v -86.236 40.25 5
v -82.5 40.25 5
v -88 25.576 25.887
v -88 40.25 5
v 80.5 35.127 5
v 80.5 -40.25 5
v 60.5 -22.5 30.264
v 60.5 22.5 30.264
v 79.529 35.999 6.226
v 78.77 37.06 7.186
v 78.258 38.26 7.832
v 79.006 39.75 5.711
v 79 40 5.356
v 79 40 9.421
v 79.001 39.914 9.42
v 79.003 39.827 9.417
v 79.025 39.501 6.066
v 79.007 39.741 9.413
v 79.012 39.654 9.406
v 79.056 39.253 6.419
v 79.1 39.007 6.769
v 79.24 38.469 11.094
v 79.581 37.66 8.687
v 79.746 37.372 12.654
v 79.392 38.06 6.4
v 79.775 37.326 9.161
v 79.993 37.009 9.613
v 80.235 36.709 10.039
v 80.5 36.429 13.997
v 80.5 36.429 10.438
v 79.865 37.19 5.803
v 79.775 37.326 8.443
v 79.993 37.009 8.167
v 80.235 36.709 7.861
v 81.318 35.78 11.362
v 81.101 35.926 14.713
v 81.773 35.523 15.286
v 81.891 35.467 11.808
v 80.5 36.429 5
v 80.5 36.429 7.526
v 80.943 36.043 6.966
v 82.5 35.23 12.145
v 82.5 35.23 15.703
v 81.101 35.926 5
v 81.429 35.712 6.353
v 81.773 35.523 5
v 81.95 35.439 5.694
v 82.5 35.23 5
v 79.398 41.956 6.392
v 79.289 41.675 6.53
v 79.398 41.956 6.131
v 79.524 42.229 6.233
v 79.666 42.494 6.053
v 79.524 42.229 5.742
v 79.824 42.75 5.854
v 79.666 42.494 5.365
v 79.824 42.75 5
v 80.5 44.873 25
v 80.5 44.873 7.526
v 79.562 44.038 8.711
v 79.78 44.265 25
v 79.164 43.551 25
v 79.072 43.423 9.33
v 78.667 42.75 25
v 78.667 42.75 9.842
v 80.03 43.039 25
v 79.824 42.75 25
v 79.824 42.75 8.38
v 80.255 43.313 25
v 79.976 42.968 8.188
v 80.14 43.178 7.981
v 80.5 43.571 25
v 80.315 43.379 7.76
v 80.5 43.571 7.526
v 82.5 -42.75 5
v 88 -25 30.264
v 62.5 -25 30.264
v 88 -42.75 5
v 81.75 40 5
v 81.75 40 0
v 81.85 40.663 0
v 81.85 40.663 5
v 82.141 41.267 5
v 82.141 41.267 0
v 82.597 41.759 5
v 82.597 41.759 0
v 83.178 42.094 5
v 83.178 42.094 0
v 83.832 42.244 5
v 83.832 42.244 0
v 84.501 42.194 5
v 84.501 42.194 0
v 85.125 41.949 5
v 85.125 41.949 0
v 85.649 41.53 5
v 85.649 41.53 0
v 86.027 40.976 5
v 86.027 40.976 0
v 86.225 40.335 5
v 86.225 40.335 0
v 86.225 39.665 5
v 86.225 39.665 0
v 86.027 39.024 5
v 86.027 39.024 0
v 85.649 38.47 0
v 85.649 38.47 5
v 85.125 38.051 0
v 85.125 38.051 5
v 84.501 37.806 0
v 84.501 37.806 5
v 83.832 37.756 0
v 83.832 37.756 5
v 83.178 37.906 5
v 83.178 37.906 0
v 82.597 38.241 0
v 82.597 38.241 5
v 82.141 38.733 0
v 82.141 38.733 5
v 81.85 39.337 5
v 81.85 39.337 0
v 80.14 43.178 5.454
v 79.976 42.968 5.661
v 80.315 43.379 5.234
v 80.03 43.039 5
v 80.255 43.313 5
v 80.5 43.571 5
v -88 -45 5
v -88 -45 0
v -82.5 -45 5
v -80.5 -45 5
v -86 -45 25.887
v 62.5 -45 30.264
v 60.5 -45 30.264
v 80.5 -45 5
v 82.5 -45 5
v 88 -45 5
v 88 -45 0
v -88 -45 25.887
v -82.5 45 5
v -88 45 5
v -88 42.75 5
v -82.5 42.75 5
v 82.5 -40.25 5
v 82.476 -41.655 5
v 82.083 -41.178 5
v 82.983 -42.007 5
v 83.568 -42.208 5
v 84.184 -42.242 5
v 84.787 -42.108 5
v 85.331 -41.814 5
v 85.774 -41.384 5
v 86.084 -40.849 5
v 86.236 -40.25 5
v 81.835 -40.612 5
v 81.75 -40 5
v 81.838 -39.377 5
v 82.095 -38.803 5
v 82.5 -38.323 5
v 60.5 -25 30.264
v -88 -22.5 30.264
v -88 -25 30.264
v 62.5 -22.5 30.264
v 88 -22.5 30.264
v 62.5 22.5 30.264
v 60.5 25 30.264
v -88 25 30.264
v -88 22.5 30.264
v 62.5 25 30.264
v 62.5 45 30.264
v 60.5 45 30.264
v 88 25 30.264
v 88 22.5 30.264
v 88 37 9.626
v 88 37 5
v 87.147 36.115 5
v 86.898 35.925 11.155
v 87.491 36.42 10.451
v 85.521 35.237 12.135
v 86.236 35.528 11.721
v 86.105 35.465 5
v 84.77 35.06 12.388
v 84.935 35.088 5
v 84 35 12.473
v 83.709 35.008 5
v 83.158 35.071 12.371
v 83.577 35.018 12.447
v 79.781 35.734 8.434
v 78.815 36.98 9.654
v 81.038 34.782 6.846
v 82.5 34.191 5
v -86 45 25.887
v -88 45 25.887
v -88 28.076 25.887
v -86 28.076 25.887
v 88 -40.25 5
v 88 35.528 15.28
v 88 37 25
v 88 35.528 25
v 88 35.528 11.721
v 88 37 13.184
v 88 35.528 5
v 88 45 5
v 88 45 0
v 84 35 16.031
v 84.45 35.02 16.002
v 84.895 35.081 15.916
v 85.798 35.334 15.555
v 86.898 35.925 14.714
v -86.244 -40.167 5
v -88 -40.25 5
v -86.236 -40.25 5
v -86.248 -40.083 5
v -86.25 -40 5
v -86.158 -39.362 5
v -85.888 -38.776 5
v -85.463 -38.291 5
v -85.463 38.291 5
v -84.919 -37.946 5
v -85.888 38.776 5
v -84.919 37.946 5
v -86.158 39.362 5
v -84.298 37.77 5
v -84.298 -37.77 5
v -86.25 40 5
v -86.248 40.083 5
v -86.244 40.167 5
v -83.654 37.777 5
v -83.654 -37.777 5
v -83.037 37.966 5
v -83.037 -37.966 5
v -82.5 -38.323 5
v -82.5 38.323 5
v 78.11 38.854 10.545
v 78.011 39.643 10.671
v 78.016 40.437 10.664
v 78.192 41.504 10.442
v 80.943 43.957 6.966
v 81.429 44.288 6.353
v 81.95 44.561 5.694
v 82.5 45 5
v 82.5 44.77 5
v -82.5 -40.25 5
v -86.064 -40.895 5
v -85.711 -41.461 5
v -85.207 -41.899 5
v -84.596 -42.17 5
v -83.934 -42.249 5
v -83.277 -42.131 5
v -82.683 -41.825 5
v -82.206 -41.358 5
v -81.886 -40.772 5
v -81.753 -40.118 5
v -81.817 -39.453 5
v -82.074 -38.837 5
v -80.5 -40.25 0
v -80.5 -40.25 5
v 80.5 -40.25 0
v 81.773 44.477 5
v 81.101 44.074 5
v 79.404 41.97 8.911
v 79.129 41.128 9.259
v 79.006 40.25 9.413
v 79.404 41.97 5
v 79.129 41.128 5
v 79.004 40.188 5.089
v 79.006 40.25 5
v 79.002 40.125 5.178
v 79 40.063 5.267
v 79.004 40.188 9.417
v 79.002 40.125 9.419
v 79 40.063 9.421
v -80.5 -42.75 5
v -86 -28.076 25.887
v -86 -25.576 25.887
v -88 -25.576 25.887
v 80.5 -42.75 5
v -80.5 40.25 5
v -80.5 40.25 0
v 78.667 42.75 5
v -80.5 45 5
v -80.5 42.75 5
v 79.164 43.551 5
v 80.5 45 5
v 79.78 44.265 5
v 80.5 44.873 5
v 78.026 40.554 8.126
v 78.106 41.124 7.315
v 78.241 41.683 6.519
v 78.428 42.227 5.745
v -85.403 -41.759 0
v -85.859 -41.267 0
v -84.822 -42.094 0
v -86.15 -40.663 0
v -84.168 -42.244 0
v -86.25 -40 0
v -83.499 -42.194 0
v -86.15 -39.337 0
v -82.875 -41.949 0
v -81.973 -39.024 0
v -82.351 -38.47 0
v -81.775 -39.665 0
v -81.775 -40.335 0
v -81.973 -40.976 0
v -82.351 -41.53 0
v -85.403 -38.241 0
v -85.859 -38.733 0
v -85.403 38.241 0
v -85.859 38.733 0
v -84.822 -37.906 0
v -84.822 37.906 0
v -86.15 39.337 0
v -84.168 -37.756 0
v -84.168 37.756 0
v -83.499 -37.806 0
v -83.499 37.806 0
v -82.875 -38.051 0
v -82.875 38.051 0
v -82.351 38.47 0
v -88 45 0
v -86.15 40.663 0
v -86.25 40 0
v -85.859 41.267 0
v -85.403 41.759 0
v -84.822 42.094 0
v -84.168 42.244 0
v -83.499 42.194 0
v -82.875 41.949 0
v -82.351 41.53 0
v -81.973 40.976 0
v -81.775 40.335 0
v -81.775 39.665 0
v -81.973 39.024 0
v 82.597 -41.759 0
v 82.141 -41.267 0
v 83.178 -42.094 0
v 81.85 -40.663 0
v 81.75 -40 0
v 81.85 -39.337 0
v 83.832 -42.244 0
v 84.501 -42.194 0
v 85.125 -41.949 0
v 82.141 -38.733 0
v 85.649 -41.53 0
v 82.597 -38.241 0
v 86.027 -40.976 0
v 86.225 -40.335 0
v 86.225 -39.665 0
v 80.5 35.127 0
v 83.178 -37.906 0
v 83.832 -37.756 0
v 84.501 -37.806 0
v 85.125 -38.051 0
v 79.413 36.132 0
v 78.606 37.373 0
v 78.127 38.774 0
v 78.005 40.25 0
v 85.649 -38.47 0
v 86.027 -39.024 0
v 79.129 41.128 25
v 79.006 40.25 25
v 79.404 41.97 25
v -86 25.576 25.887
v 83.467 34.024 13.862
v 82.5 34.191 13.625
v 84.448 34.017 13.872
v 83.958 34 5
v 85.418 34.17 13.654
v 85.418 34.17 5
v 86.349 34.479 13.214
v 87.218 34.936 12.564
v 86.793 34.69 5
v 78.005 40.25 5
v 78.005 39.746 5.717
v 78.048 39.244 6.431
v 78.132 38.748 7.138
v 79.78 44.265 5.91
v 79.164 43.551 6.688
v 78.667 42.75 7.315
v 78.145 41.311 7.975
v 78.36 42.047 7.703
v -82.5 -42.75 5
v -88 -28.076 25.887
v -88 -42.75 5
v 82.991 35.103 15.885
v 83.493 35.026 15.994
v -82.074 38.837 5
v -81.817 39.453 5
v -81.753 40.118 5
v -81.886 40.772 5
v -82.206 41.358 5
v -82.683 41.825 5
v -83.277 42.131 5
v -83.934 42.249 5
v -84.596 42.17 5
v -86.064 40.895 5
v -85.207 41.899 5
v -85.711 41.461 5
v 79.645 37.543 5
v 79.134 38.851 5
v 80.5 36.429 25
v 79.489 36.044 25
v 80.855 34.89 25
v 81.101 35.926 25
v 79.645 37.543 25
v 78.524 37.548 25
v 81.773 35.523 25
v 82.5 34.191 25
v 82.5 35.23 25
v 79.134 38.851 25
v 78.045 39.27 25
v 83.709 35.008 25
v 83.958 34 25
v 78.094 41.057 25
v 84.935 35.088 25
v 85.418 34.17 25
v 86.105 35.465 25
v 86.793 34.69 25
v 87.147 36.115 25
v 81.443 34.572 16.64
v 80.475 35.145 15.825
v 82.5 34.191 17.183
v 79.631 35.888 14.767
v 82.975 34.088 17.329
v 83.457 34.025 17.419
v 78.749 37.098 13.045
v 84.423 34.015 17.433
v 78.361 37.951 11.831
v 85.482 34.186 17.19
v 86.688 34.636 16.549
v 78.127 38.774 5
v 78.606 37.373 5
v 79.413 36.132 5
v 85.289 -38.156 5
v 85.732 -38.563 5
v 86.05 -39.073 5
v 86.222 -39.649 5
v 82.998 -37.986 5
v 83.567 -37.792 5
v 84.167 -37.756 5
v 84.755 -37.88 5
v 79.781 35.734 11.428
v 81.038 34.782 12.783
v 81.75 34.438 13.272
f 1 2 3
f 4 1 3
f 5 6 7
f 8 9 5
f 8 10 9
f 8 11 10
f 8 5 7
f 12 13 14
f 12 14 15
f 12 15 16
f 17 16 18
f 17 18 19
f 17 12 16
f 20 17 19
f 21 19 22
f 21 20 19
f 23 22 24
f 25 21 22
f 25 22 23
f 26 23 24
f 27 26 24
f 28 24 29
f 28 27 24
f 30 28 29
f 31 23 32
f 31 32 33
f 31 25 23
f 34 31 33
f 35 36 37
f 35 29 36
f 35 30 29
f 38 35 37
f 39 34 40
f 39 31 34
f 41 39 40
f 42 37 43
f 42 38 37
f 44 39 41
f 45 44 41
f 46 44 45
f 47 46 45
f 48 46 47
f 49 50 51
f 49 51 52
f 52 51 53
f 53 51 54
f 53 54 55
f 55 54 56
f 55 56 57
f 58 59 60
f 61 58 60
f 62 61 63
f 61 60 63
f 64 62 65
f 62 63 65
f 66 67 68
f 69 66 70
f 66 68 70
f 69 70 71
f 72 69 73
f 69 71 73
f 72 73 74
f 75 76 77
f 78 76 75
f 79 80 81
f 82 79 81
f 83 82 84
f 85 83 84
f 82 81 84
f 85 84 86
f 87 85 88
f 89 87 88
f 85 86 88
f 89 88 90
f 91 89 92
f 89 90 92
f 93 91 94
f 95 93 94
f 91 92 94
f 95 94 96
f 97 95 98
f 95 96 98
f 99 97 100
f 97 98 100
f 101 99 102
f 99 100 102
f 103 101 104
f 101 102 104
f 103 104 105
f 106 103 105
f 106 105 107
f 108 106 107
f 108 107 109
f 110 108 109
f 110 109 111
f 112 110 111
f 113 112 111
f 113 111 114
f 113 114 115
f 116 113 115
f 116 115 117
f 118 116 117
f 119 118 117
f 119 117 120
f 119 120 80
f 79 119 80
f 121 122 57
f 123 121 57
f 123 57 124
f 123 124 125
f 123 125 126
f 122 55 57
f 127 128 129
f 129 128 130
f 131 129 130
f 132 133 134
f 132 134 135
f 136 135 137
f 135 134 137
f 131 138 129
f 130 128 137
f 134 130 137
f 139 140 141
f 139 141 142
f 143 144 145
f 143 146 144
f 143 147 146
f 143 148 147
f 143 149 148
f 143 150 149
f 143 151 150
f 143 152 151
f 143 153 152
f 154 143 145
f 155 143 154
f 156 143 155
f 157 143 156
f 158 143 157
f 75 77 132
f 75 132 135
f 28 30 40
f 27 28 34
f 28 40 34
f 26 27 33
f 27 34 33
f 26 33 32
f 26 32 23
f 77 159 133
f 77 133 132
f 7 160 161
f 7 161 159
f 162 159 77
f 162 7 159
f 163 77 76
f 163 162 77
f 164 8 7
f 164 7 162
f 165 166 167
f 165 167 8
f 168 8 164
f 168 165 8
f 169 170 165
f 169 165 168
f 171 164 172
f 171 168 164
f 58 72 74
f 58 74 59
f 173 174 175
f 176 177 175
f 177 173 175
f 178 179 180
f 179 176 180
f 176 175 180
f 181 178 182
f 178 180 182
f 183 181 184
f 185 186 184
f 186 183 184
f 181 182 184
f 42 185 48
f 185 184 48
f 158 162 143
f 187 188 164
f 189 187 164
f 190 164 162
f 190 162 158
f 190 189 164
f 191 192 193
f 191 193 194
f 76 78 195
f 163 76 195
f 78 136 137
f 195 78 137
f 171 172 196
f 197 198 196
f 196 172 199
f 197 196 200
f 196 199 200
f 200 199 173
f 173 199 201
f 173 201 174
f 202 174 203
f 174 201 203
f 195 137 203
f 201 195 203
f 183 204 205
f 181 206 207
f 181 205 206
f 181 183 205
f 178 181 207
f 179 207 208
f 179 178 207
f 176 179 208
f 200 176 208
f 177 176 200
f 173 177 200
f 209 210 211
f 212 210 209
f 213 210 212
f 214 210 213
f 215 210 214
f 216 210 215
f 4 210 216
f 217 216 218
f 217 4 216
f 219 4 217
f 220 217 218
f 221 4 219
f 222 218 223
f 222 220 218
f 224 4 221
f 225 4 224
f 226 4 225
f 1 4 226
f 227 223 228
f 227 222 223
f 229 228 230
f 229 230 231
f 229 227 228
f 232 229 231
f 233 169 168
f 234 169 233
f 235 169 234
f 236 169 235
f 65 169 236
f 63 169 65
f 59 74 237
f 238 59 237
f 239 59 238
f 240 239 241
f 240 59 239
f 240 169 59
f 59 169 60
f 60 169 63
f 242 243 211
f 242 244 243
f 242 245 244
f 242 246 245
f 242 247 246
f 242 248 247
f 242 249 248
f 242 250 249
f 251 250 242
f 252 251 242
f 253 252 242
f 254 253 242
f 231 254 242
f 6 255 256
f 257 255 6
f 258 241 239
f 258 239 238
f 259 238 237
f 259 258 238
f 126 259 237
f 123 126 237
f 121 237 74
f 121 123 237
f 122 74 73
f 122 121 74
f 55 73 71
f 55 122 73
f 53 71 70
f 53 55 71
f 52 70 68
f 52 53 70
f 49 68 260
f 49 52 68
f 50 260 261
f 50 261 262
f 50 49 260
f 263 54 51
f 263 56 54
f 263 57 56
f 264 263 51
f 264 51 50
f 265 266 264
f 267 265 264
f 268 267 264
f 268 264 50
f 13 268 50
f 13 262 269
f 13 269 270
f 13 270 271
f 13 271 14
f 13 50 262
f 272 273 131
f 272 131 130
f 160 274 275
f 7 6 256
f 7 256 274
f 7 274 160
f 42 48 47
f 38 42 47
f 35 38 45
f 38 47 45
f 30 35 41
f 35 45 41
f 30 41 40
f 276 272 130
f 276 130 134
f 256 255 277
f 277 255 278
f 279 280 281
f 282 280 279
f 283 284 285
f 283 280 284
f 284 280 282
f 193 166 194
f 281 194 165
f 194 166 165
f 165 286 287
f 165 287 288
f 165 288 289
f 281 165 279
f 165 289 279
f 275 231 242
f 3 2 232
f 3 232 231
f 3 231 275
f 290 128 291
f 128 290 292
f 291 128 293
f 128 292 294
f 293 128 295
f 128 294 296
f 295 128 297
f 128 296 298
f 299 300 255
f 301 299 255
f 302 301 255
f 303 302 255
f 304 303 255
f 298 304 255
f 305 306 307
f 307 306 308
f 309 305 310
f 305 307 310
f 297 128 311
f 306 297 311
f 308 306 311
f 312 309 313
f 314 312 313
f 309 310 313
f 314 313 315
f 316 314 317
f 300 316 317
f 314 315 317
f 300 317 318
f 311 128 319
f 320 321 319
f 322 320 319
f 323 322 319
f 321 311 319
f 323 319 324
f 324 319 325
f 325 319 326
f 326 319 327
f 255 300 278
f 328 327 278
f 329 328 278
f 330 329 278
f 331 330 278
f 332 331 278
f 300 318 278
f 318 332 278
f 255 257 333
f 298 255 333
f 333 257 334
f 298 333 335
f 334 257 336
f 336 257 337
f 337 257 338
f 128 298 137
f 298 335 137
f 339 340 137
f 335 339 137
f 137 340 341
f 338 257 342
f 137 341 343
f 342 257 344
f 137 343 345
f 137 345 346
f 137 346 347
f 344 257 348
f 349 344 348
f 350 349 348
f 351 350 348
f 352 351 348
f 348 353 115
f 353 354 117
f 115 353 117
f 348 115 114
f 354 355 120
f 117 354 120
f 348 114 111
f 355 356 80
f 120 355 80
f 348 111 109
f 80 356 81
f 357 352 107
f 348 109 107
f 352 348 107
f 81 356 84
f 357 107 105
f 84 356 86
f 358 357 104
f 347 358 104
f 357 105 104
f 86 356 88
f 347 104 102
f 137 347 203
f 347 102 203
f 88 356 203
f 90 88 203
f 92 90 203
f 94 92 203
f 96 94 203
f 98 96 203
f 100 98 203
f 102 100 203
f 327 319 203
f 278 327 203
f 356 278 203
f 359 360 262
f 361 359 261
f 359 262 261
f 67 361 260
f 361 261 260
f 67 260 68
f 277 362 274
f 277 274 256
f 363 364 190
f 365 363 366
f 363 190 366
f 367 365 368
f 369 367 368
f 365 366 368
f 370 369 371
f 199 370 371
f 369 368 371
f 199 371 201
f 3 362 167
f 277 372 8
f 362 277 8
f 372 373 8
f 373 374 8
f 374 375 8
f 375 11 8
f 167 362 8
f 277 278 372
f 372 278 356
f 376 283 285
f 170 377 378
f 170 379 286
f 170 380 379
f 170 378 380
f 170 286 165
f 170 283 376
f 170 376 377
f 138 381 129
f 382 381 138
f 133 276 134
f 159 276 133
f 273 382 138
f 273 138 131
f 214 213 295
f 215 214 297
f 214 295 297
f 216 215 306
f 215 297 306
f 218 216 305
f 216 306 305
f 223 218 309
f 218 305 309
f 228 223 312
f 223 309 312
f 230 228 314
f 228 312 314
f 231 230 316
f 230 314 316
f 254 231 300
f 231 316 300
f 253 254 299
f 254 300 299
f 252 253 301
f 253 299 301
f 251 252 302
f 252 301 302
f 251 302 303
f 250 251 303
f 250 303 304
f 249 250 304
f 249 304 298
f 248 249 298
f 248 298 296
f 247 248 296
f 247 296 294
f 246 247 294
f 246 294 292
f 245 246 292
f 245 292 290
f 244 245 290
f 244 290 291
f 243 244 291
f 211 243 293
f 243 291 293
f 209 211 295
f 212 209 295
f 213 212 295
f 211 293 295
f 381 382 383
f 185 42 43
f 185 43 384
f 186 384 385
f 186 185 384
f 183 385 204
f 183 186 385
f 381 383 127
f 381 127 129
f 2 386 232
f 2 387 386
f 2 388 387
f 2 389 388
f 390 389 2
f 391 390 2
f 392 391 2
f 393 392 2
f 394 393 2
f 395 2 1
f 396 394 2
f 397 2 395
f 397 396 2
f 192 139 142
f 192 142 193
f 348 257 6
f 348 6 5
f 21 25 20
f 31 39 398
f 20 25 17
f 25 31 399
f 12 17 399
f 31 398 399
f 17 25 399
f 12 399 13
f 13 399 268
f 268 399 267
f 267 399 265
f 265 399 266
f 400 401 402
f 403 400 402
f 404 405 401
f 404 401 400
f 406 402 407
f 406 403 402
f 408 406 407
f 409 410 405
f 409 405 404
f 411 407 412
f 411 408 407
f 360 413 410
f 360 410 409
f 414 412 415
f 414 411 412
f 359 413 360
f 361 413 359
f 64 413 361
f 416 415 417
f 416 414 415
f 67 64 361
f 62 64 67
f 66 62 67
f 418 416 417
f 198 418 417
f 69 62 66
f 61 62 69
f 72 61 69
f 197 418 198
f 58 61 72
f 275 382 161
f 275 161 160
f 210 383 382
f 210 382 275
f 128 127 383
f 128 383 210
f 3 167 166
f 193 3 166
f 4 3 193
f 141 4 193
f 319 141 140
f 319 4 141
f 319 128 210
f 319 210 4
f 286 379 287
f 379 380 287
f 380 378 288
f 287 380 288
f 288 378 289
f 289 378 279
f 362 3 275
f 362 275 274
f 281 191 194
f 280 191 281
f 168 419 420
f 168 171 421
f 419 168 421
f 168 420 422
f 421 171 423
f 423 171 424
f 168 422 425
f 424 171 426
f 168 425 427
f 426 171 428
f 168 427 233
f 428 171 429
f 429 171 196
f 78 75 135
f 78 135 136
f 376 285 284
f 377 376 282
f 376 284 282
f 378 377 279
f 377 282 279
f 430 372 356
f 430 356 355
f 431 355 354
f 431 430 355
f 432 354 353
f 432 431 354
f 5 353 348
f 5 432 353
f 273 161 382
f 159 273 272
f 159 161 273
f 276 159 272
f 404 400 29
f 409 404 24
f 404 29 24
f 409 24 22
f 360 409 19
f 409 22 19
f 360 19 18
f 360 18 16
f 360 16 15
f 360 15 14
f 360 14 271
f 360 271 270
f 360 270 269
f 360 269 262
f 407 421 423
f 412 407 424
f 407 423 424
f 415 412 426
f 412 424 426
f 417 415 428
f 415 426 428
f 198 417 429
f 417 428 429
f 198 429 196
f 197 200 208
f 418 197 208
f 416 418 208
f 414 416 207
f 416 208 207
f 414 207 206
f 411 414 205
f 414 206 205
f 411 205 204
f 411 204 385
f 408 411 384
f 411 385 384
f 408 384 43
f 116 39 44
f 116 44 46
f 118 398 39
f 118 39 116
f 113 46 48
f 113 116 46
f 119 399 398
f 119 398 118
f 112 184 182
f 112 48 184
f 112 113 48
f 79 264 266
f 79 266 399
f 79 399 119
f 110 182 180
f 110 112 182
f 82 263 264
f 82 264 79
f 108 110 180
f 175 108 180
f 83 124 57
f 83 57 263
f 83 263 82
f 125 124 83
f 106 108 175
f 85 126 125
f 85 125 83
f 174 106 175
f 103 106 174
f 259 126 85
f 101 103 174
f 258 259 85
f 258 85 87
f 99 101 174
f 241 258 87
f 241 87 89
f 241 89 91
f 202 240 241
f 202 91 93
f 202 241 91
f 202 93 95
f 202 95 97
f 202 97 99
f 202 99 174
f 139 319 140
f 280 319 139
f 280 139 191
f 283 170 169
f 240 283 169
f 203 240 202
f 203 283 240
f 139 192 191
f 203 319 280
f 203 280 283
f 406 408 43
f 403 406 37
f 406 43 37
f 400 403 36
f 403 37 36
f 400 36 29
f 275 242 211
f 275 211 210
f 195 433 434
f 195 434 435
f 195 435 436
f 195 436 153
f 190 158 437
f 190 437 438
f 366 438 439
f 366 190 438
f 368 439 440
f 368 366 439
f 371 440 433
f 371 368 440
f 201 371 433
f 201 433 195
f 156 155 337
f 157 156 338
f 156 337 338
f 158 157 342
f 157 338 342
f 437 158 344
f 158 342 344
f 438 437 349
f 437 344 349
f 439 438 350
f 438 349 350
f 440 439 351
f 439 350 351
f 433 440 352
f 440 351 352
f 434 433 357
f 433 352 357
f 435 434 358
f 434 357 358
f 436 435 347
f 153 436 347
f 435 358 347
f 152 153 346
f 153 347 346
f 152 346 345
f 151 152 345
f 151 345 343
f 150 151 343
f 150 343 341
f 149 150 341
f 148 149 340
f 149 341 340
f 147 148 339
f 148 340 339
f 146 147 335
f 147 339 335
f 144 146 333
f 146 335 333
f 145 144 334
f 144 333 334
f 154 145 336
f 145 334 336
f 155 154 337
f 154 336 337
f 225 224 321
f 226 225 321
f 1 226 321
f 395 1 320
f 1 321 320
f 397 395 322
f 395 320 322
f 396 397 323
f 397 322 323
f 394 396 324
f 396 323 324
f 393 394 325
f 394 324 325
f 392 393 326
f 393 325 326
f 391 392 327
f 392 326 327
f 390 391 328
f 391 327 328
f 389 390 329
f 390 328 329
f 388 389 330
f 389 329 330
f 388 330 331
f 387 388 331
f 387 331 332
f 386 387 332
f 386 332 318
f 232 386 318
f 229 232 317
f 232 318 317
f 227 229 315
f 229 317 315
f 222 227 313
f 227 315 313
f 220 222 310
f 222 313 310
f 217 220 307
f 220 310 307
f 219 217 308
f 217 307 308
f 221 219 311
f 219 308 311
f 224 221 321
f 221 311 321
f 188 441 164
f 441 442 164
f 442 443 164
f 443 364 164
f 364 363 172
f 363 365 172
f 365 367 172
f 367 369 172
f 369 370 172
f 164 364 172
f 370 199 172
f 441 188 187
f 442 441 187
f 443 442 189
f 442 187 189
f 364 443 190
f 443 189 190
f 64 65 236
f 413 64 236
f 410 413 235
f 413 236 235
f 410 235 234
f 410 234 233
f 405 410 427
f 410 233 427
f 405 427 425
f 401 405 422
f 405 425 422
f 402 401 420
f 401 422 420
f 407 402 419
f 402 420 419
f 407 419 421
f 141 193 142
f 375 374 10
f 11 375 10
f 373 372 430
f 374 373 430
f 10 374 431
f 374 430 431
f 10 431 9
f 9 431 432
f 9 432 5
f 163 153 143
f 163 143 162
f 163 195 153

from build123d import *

# Parameters (mm, degrees)
SKETCH1_W            = 176
SKETCH1_H            = 90
SKETCH1_W_2          = 161
SKETCH1_H_2          = 80.5
BOSS_EXTRUDE1_DEPTH  = 5
M4_CLEARANCE_HOLE1_D = 4.5
BOSS_EXTRUDE2_DEPTH  = 90
BOSS_EXTRUDE11_DEPTH = 176
CUT_EXTRUDE1_DEPTH   = 20
BOSS_EXTRUDE12_DEPTH = 20
BOSS_EXTRUDE13_DEPTH = 5


with BuildPart() as part:
    # Sketch1 → Boss-Extrude1 (new body)
    with BuildSketch(Plane.XY):
        Rectangle(SKETCH1_W, SKETCH1_H)
        Rectangle(SKETCH1_W_2, SKETCH1_H_2, mode=Mode.SUBTRACT)
    extrude(amount=BOSS_EXTRUDE1_DEPTH)

    # M4 Clearance Hole1 (through all)
    with Locations(Plane.XY.offset(5)):
        with Locations((84, 40), (-84, -40), (-84, 40), (84, -40)):
            Hole(M4_CLEARANCE_HOLE1_D / 2)

    # Sketch7 → Boss-Extrude2 (add)
    with BuildSketch(Plane(origin=(0, 45, 0), x_dir=(1, 0, 0), z_dir=(0, 1, 0))):
        Polygon((-82.5, -5), (-88, -25.886602241), (-86, -25.886602241), (-80.5, -5), align=None)
        Polygon((80.5, -5), (60.5, -30.264322131), (62.5, -30.264322131), (82.5, -5), align=None)
    extrude(amount=-BOSS_EXTRUDE2_DEPTH)


with BuildPart() as body_2:
    # Sketch8 → Boss-Extrude11 (new body)
    with BuildSketch(Plane(origin=(88, 0, 0), x_dir=(0, 0, -1), z_dir=(1, 0, 0))):
        Polygon((-5, 40.25), (-30.264322131, 22.5), (-30.264322131, 25), (-5, 42.75), align=None)
    extrude(amount=-BOSS_EXTRUDE11_DEPTH)


with BuildPart() as body_3:
    # Mirror2: mirrored copy
    add(body_2.part.mirror(Plane.ZX))


with BuildPart() as body_2_1:
    add(body_2.part)

    # Combine2: union body 3, part
    add(body_3.part)
    add(part.part)

    # Sketch9 → Cut-Extrude1 (cut)
    with BuildSketch(Plane.XY.offset(5)):
        with BuildLine():
            Line((84, 37.75), (84, 35))
            ThreePointArc((84, 35), (86.236067977, 35.527864045), (88, 37))
            Line((88, 37), (88, 40.25))
            Line((88, 40.25), (86.236067977, 40.25))
            ThreePointArc((86.236067977, 40.25), (85.677050983, 38.5), (84, 37.75))
        make_face()
        with BuildLine():
            ThreePointArc((89, 40), (84, 45), (79, 40))
            Line((79, 40), (84, 40))
            Line((84, 40), (84, 37.75))
            ThreePointArc((84, 37.75), (85.677050983, 38.5), (86.236067977, 40.25))
            Line((86.236067977, 40.25), (88, 40.25))
            Line((88, 40.25), (88, 37))
            ThreePointArc((88, 37), (88.74341649, 38.41886117), (89, 40))
        make_face()
        with BuildLine():
            ThreePointArc((79, 40), (79.968871126, 37.041960108), (82.5, 35.230303993))
            Line((82.5, 35.230303993), (82.5, 38.322949017))
            ThreePointArc((82.5, 38.322949017), (83.197150298, 37.898112192), (84, 37.75))
            Line((84, 37.75), (84, 40))
            Line((84, 40), (79, 40))
        make_face()
        with BuildLine():
            Line((82.5, 38.322949017), (82.5, 35.230303993))
            ThreePointArc((82.5, 35.230303993), (83.241211504, 35.057911371), (84, 35))
            Line((84, 35), (84, 37.75))
            ThreePointArc((84, 37.75), (83.197150298, 37.898112192), (82.5, 38.322949017))
        make_face()
    extrude(amount=CUT_EXTRUDE1_DEPTH, mode=Mode.SUBTRACT)

    # Sketch10 → Boss-Extrude12 (add)
    with BuildSketch(Plane.XY.offset(5)):
        with BuildLine():
            Line((88, 35.527864045), (88, 37))
            ThreePointArc((88, 37), (85.531488162, 35.240321018), (82.5, 35.230303993))
            Line((82.5, 35.230303993), (82.5, 34.190524981))
            ThreePointArc((82.5, 34.190524981), (85.417610293, 34.169872981), (88, 35.527864045))
        make_face()
        with BuildLine():
            Line((82.5, 34.190524981), (82.5, 35.230303993))
            ThreePointArc((82.5, 35.230303993), (81.429126737, 35.711572472), (80.5, 36.429285786))
            ThreePointArc((80.5, 36.429285786), (79.343242015, 38.179394313), (79.006253911, 40.25))
            ThreePointArc((79.006253911, 40.25), (79.24786884, 41.554750602), (79.824176728, 42.75))
            Line((79.824176728, 42.75), (78.667317748, 42.75))
            ThreePointArc((78.667317748, 42.75), (78.523911995, 37.547968157), (82.5, 34.190524981))
        make_face()
        with BuildLine():
            ThreePointArc((79.824176728, 42.75), (80.140212612, 43.178370859), (80.5, 43.570714214))
            Line((80.5, 43.570714214), (80.5, 44.873397172))
            ThreePointArc((80.5, 44.873397172), (79.457833906, 43.920296822), (78.667317748, 42.75))
            Line((78.667317748, 42.75), (79.824176728, 42.75))
        make_face()
    extrude(amount=BOSS_EXTRUDE12_DEPTH)

    # Sketch11 → Boss-Extrude13 (add)
    with BuildSketch(Plane.XY.offset(5)):
        with BuildLine():
            Line((80.5, 35.126602828), (80.5, 40.25))
            Line((80.5, 40.25), (78.005210596, 40.25))
            ThreePointArc((78.005210596, 40.25), (78.605553216, 37.373225572), (80.5, 35.126602828))
        make_face()
    extrude(amount=-BOSS_EXTRUDE13_DEPTH)


solid = body_2_1.part
